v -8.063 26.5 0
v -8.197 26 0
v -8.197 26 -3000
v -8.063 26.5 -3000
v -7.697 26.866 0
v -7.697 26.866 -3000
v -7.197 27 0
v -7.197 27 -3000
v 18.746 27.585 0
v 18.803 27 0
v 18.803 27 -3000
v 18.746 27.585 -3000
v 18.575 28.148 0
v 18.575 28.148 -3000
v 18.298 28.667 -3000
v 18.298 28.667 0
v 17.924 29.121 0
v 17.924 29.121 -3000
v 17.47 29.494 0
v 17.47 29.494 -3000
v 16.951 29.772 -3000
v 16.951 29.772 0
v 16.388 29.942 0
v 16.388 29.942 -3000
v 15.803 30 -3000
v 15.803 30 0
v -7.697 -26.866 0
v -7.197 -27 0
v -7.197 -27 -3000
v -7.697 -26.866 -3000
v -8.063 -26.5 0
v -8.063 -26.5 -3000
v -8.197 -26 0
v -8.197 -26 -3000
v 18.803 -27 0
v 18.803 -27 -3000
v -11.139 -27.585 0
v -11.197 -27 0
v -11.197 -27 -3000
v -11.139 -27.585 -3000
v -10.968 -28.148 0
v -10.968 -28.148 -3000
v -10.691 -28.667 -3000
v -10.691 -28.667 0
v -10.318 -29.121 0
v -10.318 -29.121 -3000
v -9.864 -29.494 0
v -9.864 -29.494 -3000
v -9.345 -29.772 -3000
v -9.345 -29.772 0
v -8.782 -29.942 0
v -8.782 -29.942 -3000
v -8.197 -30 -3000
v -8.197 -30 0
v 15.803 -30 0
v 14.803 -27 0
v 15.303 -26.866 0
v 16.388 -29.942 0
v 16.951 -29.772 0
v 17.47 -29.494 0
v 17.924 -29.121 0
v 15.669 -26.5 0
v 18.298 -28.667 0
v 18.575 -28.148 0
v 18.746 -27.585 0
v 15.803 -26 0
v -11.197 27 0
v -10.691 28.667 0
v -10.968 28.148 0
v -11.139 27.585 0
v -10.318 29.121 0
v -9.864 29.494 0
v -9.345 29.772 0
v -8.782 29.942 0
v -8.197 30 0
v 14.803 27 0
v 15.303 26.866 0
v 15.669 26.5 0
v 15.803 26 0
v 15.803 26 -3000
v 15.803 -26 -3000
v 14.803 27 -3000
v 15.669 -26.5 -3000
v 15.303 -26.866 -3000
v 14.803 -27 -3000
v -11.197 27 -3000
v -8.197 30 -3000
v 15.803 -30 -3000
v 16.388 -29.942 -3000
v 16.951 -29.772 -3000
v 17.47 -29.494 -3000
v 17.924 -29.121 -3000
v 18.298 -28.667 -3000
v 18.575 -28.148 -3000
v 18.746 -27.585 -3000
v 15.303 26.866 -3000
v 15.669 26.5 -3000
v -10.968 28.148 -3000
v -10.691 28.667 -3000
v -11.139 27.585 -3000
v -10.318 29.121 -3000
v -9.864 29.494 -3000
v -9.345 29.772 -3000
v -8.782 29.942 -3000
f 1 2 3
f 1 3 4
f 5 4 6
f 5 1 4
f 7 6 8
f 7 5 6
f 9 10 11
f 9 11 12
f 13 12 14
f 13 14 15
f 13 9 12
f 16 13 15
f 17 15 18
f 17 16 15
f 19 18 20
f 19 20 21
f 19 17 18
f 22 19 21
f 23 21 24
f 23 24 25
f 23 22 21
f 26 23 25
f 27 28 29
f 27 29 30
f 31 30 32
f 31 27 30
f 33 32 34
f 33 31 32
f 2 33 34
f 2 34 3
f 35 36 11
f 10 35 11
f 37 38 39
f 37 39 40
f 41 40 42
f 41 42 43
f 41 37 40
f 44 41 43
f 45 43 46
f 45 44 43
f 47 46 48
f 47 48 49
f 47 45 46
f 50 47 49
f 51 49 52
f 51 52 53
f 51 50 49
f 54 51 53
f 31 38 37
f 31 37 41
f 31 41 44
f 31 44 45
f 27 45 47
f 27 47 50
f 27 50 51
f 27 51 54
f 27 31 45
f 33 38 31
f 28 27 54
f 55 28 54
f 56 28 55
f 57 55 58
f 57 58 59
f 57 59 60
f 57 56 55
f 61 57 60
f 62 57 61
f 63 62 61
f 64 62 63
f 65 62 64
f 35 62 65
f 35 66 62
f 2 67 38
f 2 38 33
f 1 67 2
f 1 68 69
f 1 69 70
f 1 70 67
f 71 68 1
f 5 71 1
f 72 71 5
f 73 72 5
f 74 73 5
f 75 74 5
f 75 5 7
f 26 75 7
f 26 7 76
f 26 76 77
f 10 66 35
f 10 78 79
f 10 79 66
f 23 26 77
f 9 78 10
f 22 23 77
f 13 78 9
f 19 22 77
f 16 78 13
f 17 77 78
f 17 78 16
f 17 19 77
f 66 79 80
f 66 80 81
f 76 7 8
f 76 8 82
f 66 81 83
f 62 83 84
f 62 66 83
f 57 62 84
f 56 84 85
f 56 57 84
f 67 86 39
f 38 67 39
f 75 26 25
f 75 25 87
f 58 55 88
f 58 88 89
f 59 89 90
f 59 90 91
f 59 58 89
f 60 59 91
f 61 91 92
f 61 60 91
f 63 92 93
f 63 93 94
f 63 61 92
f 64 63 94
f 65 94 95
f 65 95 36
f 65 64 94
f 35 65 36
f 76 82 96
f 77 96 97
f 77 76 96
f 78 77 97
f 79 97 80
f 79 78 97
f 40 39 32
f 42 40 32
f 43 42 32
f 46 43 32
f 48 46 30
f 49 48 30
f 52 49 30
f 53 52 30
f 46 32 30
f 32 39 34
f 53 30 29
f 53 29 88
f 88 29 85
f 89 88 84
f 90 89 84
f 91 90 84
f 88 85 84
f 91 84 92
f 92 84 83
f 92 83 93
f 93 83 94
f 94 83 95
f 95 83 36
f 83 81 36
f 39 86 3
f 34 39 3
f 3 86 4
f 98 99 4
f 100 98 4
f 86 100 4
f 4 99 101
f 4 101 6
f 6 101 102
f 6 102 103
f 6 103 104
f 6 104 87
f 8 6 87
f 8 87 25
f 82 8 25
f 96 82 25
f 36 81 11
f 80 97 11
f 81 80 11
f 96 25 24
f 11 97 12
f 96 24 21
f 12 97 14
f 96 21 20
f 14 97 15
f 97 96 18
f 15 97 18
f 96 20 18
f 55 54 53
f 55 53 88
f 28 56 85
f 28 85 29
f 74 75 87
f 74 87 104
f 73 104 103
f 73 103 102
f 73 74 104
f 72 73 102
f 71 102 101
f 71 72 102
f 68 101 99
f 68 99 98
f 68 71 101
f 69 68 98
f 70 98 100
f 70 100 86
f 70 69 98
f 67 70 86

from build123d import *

# Parameters (mm, degrees)
DODANIE_WYCI_GNI_CIE1_DEPTH = 3000


with BuildPart() as part:
    # Szkic1 → Dodanie-wyciągnięcie1 (new body)
    with BuildSketch(Plane.XY):
        with BuildLine():
            Line((-8.196850851, -30), (15.803149149, -30))
            ThreePointArc((15.803149149, -30), (17.924469493, -29.121320344), (18.803149149, -27))
            Line((18.803149149, -27), (18.803149149, 27))
            ThreePointArc((18.803149149, 27), (17.924469493, 29.121320344), (15.803149149, 30))
            Line((15.803149149, 30), (-8.196850851, 30))
            ThreePointArc((-8.196850851, 30), (-10.318171195, 29.121320344), (-11.196850851, 27))
            Line((-11.196850851, 27), (-11.196850851, -27))
            ThreePointArc((-11.196850851, -27), (-10.318171195, -29.121320344), (-8.196850851, -30))
        make_face()
        with BuildLine():
            Line((-7.196850851, 27), (14.803149149, 27))
            ThreePointArc((14.803149149, 27), (15.51025593, 26.707106781), (15.803149149, 26))
            Line((15.803149149, 26), (15.803149149, -26))
            ThreePointArc((15.803149149, -26), (15.51025593, -26.707106781), (14.803149149, -27))
            Line((14.803149149, -27), (-7.196850851, -27))
            ThreePointArc((-7.196850851, -27), (-7.903957632, -26.707106781), (-8.196850851, -26))
            Line((-8.196850851, -26), (-8.196850851, 26))
            ThreePointArc((-8.196850851, 26), (-7.903957632, 26.707106781), (-7.196850851, 27))
        make_face(mode=Mode.SUBTRACT)
    extrude(amount=-DODANIE_WYCI_GNI_CIE1_DEPTH)


solid = part.part
